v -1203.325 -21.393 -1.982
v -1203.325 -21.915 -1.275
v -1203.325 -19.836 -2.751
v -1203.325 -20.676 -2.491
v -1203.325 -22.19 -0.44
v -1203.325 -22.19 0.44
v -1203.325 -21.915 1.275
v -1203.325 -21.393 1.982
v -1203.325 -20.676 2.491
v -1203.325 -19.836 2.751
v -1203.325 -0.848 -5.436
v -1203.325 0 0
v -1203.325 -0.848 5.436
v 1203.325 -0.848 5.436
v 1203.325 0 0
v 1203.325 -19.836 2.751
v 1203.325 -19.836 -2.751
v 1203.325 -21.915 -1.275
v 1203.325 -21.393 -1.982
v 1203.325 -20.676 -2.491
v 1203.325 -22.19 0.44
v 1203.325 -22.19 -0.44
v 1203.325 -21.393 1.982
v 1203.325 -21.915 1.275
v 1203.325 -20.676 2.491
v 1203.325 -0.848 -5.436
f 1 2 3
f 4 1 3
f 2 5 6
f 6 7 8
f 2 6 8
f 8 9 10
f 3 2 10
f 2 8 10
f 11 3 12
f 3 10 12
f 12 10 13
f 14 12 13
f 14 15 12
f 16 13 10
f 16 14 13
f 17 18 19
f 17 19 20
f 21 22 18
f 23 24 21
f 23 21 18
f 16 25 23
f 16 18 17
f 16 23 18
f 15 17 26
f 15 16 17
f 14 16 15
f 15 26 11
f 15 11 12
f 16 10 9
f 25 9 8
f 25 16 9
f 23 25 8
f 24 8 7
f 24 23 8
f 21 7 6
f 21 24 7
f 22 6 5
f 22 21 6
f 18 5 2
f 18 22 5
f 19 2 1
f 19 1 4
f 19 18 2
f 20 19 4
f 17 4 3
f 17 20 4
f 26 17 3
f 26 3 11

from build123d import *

# Parameters (mm, degrees)
F1_DEPTH = 1203.325


with BuildPart() as f1:
    # F0 (on Right) → F1 (new body, symmetric)
    with BuildSketch(Plane.YZ):
        with BuildLine():
            ThreePointArc((-16.66875, 0), (-17.6251806772, 2.097476653), (-19.8359280858, 2.7507483004))
            ThreePointArc((-19.8359280858, 2.7507483004), (-22.225, 0), (-19.8359280858, -2.7507483004))
            ThreePointArc((-19.8359280858, -2.7507483004), (-17.6251806772, -2.097476653), (-16.66875, 0))
        make_face()
        with BuildLine():
            Line((-0.8483794827, -5.4362591395), (0, 0))
            Line((0, 0), (-0.8483794827, 5.4362591395))
            Line((-0.8483794827, 5.4362591395), (-19.8359280858, 2.7507483004))
            ThreePointArc((-19.8359280858, 2.7507483004), (-17.6251806772, 2.097476653), (-16.66875, 0))
            ThreePointArc((-16.66875, 0), (-17.6251806772, -2.097476653), (-19.8359280858, -2.7507483004))
            Line((-19.8359280858, -2.7507483004), (-0.8483794827, -5.4362591395))
        make_face()
    extrude(amount=F1_DEPTH, both=True)


solid = f1.part
